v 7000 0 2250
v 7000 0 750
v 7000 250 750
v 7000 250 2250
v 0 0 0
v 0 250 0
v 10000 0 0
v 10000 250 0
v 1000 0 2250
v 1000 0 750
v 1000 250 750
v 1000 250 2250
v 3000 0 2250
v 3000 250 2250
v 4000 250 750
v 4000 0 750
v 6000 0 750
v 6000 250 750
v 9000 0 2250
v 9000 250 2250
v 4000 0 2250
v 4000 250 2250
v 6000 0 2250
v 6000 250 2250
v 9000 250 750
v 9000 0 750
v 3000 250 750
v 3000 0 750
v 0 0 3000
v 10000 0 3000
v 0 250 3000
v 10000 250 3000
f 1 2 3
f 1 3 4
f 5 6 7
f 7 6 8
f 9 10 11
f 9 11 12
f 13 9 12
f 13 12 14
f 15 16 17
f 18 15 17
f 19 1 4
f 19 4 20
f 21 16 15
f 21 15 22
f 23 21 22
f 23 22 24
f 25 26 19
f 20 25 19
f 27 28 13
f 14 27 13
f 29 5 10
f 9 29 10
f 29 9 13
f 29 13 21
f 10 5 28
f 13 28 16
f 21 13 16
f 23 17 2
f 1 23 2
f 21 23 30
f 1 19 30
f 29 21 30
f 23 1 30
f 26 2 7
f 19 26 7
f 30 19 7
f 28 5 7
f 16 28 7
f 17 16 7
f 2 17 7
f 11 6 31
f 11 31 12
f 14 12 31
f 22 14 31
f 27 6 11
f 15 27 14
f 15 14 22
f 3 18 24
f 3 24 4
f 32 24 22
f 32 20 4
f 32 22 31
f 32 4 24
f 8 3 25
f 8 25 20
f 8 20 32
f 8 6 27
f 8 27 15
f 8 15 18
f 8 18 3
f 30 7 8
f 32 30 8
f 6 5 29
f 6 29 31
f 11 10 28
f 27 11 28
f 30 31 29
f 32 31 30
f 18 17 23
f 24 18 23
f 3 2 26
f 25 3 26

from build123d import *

# Parameters (mm, degrees)
SKETCH_W      = 2000
SKETCH_H      = 1500
EXTRUDE_DEPTH = 350
BOX_W         = 10000
BOX_H         = 250
BOX_DEPTH     = 3000


with BuildPart() as extrude_body:
    # Sketch (on Face3 of Box) → Extrude (new body)
    with BuildSketch(Plane.XZ):
        with Locations((2000, 1500)):
            Rectangle(SKETCH_W, SKETCH_H)
        with Locations((5000, 1500)):
            Rectangle(SKETCH_W, SKETCH_H)
        with Locations((8000, 1500)):
            Rectangle(SKETCH_W, SKETCH_H)
    extrude(amount=-EXTRUDE_DEPTH)


with BuildPart() as cut:
    # Box → Box (new body)
    with BuildSketch(Plane.XY):
        with Locations((5000, 125)):
            Rectangle(BOX_W, BOX_H)
    extrude(amount=BOX_DEPTH)

    # Cut: cut Extrude body
    add(extrude_body.part, mode=Mode.SUBTRACT)


solid = cut.part
